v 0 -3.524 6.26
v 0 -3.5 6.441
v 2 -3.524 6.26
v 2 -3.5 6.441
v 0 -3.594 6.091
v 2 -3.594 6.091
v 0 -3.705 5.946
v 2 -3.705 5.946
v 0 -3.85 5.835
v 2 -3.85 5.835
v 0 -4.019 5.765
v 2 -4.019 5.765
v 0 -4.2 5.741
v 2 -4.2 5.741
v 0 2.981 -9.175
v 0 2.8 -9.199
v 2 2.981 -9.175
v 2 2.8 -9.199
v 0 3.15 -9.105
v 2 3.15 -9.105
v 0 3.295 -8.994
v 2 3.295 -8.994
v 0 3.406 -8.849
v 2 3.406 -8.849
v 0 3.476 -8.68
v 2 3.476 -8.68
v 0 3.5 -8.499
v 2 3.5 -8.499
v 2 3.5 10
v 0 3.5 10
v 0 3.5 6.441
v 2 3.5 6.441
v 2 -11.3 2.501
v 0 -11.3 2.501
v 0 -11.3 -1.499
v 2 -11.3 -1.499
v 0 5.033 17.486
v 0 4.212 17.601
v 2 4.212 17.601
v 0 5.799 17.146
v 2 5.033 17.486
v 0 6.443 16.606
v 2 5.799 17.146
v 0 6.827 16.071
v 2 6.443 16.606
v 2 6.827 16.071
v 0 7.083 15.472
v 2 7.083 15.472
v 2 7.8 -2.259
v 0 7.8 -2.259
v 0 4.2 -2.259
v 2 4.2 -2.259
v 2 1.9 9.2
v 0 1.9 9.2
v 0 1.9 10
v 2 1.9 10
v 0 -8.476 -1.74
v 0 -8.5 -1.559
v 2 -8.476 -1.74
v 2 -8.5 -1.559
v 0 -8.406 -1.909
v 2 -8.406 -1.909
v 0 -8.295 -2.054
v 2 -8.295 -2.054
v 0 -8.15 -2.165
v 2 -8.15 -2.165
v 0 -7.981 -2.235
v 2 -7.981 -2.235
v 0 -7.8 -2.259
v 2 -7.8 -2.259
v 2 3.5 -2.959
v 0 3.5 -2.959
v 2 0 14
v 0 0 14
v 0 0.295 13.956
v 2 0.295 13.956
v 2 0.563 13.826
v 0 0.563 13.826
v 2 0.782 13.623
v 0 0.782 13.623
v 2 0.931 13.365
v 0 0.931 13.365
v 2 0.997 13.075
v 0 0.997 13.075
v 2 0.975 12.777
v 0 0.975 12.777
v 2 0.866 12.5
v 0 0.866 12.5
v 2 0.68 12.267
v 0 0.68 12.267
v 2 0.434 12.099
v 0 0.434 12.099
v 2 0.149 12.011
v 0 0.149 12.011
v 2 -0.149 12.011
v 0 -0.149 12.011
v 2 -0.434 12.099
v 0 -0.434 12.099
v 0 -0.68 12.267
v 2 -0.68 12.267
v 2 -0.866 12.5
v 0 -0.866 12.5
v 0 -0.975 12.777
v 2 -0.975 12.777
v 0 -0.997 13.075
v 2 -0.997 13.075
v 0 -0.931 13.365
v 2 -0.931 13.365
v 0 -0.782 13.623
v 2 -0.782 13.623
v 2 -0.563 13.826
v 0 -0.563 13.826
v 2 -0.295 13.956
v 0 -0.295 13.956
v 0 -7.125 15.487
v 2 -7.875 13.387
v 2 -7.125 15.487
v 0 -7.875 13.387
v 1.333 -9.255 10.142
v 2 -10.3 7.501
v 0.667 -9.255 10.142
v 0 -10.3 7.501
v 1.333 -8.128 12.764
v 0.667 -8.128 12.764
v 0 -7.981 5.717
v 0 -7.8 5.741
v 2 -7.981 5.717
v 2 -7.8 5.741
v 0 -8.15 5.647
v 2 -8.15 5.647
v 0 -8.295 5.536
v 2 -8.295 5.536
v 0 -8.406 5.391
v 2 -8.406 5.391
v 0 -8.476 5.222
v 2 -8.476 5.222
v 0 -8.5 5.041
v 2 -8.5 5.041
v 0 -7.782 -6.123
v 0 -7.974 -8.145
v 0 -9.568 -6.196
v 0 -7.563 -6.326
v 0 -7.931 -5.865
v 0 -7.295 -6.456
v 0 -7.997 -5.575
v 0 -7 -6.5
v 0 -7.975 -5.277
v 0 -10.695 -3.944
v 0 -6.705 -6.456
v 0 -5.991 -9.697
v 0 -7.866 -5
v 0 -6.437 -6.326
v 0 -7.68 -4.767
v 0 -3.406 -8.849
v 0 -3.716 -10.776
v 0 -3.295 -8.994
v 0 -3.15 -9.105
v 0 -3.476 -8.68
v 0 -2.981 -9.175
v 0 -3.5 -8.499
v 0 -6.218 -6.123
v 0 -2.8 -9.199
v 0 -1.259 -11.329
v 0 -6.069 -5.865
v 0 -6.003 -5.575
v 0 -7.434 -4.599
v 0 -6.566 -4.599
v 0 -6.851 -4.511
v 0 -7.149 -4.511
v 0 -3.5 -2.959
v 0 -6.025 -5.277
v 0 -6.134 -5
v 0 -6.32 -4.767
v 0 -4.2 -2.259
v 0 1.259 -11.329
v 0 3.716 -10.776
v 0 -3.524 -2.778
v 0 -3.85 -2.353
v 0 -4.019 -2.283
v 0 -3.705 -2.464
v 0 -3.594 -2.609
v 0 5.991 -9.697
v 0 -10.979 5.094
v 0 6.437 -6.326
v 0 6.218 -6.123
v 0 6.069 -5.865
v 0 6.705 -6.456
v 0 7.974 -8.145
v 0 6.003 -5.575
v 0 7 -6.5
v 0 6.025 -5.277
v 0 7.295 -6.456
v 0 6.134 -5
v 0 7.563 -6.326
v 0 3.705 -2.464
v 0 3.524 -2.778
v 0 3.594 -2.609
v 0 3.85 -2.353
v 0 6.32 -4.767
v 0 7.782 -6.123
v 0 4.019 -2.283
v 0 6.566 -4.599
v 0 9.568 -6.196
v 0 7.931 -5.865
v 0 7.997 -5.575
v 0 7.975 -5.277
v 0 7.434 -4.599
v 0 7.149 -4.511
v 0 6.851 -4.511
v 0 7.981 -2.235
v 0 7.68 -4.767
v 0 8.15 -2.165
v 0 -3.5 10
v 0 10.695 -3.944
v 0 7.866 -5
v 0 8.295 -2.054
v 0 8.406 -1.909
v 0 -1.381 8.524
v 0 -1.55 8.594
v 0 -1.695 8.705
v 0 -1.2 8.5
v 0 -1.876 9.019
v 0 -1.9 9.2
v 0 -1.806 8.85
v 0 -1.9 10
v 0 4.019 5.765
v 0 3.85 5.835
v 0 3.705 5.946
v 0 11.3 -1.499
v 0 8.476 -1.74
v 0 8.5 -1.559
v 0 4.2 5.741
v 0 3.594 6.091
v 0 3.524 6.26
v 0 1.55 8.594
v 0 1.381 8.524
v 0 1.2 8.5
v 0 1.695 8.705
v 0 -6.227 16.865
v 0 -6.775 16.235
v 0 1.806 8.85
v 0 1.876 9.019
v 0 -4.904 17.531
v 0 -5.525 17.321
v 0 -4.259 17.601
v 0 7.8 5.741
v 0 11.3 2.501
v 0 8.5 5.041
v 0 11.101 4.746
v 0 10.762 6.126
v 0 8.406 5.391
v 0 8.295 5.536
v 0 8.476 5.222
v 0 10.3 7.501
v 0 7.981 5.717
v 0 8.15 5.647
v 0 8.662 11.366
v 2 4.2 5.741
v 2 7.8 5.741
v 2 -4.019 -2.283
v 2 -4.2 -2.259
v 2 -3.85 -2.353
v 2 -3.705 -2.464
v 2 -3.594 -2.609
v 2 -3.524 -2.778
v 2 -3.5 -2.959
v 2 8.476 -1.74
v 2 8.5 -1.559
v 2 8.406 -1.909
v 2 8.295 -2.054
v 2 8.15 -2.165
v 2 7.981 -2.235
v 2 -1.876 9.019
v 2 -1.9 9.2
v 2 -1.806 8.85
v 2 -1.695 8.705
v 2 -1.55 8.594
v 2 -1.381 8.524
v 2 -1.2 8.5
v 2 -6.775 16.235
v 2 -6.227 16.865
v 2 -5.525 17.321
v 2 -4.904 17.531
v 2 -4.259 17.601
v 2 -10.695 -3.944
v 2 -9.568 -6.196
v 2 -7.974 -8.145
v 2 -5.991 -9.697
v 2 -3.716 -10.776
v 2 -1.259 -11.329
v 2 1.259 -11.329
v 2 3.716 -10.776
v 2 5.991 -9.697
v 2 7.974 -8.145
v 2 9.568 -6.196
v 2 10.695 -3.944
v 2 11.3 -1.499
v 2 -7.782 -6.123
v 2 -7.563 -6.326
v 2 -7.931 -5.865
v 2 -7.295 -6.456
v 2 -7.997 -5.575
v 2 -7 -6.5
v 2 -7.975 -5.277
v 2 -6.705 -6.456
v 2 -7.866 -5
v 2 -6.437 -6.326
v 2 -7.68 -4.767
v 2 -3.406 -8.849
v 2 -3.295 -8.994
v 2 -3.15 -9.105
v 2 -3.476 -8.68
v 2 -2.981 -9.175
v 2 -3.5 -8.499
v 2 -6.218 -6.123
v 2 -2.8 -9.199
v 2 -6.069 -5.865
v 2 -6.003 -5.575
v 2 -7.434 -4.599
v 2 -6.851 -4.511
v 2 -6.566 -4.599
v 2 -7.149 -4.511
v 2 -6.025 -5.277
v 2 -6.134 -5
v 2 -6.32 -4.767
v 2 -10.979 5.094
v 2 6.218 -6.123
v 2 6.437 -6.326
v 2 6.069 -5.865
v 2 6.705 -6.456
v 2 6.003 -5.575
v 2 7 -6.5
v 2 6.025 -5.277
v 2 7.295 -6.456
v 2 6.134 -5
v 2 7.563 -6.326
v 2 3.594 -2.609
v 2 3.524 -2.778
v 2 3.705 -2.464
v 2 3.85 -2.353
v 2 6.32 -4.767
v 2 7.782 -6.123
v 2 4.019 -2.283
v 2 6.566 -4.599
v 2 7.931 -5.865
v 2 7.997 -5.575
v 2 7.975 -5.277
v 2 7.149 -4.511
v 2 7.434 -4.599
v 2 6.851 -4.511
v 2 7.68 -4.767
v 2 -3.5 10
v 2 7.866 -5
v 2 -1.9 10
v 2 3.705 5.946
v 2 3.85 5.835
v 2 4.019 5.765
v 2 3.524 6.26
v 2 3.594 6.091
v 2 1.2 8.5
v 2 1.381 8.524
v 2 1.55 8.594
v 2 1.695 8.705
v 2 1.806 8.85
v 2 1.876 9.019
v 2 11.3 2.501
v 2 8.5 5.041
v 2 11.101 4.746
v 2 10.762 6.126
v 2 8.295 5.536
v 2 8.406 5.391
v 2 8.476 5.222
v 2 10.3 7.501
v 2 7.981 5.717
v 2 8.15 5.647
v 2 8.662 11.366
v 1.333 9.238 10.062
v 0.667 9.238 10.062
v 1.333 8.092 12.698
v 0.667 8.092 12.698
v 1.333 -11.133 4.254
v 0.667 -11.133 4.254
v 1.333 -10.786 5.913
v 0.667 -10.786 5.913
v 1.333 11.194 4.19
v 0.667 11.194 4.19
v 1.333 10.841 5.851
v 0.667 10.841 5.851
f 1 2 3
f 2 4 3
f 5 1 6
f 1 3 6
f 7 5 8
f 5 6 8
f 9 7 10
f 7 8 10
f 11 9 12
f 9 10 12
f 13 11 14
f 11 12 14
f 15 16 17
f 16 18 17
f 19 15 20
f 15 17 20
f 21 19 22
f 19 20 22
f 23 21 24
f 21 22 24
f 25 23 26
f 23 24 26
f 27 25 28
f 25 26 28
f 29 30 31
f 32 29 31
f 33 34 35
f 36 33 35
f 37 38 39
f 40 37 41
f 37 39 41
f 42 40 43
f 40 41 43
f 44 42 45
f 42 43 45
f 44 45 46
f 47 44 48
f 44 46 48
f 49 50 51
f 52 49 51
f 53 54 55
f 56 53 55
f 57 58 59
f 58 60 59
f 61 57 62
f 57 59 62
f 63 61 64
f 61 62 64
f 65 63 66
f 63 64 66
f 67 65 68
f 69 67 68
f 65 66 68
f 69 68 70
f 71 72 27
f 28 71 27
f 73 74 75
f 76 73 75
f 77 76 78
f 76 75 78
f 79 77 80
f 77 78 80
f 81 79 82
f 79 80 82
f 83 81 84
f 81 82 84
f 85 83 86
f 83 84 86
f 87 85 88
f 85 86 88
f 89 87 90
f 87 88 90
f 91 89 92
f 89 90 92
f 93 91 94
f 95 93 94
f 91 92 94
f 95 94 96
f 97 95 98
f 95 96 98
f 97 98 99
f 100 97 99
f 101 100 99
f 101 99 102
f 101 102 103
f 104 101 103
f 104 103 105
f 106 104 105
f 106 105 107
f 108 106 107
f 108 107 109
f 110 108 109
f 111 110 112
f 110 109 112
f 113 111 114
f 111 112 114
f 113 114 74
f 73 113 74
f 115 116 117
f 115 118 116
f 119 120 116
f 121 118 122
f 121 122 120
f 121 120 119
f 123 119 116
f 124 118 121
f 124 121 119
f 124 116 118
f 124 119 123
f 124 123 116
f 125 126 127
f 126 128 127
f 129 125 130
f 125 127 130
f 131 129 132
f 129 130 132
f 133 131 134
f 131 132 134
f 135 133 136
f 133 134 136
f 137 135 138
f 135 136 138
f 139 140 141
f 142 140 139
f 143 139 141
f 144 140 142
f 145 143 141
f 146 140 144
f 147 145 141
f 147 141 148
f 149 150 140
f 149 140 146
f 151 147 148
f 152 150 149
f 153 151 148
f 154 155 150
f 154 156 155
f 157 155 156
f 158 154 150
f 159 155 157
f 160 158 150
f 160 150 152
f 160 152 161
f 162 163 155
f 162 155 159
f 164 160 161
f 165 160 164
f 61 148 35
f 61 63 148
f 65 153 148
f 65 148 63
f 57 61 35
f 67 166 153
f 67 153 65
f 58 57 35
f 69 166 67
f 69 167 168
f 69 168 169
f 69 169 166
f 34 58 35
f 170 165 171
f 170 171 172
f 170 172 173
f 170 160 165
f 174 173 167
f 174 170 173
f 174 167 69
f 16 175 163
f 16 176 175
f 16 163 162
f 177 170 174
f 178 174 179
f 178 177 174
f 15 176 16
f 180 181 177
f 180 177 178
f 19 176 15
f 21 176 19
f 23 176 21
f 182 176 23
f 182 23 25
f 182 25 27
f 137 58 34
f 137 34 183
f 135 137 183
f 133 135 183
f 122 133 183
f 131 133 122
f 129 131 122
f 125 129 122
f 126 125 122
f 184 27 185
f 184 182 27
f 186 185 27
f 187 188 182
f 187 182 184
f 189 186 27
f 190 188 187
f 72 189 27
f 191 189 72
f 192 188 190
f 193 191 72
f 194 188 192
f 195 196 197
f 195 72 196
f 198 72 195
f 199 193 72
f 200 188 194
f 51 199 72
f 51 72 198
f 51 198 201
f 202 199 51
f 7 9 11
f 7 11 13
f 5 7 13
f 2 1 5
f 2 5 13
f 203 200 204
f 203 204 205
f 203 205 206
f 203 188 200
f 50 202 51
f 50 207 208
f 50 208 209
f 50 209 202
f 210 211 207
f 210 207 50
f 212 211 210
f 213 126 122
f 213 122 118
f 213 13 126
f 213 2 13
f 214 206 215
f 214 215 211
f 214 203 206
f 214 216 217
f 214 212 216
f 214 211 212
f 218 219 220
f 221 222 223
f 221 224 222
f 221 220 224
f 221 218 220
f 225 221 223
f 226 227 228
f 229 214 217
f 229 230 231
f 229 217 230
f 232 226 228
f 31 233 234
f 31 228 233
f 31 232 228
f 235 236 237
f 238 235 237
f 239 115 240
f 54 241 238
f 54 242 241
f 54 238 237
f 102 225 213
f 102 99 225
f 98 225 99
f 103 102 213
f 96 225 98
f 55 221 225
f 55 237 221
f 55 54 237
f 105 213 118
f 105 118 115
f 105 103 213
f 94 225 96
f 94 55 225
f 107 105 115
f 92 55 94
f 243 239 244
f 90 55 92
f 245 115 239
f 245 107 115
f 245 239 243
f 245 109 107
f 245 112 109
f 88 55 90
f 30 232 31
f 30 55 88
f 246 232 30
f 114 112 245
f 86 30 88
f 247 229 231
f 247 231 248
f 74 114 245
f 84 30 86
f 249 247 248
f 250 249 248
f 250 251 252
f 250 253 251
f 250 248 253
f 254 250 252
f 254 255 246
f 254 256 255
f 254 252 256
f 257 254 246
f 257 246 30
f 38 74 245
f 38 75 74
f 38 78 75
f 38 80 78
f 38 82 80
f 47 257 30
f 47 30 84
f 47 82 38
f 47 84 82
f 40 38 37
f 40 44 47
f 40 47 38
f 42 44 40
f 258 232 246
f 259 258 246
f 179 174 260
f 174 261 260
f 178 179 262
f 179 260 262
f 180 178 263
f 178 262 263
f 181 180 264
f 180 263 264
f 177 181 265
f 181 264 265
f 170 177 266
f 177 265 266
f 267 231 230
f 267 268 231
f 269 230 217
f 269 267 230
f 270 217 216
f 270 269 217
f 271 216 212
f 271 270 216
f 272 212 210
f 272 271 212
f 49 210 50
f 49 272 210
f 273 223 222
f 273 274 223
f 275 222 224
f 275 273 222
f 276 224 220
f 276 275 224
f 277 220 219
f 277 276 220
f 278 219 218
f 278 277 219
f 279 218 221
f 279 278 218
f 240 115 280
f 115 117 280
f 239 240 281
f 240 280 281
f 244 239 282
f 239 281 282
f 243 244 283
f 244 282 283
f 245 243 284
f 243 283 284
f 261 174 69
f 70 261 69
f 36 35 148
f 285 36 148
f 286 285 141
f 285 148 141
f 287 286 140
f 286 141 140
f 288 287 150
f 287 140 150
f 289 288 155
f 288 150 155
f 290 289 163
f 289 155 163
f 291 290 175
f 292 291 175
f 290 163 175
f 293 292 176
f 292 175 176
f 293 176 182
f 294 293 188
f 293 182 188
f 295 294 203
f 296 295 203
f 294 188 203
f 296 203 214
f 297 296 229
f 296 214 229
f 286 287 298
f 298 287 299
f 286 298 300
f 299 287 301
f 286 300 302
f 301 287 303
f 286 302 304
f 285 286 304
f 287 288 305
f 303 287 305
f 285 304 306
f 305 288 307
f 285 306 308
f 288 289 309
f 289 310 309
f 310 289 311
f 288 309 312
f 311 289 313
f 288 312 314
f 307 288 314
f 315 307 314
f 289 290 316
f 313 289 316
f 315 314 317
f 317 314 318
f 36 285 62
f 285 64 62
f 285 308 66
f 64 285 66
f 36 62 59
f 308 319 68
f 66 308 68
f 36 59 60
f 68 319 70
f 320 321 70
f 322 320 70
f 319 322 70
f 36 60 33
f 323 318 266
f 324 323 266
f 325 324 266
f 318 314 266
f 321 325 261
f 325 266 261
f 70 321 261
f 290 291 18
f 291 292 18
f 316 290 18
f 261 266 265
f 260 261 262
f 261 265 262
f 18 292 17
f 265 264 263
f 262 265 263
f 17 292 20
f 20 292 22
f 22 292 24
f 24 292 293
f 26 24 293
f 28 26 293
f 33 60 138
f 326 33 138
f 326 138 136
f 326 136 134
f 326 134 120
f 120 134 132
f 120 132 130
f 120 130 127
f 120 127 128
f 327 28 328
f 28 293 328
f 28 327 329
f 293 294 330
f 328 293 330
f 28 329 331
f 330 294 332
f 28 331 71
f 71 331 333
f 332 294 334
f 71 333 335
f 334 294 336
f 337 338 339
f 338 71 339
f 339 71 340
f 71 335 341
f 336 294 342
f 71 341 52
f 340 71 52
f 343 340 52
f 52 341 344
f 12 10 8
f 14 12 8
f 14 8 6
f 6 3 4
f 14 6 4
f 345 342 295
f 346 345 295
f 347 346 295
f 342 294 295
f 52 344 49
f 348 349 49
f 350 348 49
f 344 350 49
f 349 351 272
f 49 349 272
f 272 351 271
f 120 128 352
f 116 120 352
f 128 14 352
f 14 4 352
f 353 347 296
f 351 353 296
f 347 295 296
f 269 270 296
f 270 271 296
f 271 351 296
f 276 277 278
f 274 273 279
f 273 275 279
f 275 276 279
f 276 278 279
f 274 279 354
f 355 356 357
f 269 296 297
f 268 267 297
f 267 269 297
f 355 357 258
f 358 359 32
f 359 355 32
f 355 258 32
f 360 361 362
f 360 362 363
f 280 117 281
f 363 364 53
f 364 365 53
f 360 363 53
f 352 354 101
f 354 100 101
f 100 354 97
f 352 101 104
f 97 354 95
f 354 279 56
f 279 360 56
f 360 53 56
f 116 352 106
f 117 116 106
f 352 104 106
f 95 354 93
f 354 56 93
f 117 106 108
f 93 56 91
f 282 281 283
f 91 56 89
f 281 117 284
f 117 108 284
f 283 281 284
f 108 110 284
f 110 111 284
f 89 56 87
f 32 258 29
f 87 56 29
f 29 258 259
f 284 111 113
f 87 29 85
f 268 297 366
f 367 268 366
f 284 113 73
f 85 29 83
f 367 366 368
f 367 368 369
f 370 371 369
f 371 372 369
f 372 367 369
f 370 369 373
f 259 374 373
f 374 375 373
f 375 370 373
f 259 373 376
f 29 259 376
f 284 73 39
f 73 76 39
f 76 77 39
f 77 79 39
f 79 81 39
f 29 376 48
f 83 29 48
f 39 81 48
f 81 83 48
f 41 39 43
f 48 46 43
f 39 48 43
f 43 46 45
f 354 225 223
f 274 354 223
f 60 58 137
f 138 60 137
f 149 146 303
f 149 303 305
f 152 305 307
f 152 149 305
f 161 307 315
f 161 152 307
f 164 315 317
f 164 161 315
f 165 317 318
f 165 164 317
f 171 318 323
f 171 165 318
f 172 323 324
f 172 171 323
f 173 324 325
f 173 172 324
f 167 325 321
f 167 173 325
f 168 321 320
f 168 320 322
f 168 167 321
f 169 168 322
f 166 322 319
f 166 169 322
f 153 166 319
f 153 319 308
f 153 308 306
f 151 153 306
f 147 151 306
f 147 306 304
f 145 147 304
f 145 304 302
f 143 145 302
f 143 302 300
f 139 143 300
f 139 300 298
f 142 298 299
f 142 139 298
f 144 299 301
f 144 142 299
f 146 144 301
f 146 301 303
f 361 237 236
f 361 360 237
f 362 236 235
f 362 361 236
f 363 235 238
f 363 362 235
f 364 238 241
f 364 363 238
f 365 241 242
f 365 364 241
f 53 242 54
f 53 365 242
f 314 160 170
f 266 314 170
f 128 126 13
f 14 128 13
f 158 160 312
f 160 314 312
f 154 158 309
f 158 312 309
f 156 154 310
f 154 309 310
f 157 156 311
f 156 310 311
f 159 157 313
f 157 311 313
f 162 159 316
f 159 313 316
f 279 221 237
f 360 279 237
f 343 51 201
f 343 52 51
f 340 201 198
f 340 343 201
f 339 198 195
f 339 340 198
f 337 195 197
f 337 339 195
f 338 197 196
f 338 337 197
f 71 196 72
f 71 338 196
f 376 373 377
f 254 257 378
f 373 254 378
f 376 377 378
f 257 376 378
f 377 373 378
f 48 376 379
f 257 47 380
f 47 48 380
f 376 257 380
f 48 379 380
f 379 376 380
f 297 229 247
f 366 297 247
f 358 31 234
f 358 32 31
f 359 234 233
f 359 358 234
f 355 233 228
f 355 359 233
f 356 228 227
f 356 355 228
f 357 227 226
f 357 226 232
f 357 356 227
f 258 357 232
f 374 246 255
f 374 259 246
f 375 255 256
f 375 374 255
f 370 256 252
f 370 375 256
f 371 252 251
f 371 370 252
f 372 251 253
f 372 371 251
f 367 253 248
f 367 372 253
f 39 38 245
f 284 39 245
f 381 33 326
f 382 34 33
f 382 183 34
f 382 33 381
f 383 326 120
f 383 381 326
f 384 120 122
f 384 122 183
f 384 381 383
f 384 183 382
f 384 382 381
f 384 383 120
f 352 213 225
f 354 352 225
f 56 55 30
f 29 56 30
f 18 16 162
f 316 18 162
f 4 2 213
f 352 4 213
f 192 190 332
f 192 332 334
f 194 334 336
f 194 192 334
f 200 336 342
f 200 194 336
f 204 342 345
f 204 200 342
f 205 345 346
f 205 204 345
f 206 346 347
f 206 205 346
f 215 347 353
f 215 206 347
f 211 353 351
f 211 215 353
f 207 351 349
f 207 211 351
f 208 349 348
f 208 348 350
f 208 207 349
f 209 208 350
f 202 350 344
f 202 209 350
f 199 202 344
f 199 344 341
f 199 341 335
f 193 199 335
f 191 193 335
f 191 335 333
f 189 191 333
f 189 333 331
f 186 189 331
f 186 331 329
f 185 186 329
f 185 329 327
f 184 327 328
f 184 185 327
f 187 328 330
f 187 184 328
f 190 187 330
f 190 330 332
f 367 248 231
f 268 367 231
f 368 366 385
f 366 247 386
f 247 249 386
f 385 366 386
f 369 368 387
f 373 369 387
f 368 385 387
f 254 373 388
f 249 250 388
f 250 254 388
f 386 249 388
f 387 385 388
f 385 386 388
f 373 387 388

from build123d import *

# Parameters (mm, degrees)
SCHIZZO1_R                   = 1
ESTRUSIONE_ESTRUSIONE1_DEPTH = 2
RACCORDO2_R                  = 3
RACCORDO3_R                  = 3
RACCORDO4_R                  = 0.7
RACCORDO5_R                  = 0.7


with BuildPart() as part:
    # Schizzo1 → Estrusione-Estrusione1 (new body)
    with BuildSketch(Plane(origin=(0, 0, 0), x_dir=(0, 0, -1), z_dir=(1, 0, 0))):
        with BuildLine():
            add(Edge.make_bspline(
                [(-7.501010101, -10.3), (-10.845030199, -9.13986581), (-13.865102381, -7.304364218), (-17.601010101, -6.594005849)],
                knots=[0.271280726, 0.271280726, 0.271280726, 0.271280726, 0.852483684, 0.852483684, 0.852483684, 0.852483684], degree=3))
            add(Edge.make_bspline(
                [(-2.501010101, -11.3), (-4.308742426, -11.235865063), (-5.940164296, -10.841501107), (-7.501010101, -10.3)],
                knots=[0, 0, 0, 0, 0.271280726, 0.271280726, 0.271280726, 0.271280726], degree=3))
            Line((-2.501010101, -11.3), (1.498989899, -11.3))
            ThreePointArc((1.498989899, -11.3), (11.398989899, 0), (1.498989899, 11.3))
            Line((1.498989899, 11.3), (-2.501010101, 11.3))
            add(Edge.make_bspline(
                [(-2.501010101, 11.3), (-4.209338931, 11.338090952), (-5.850739142, 10.914740779), (-7.501010101, 10.3)],
                knots=[0, 0, 0, 0, 0.293888871, 0.293888871, 0.293888871, 0.293888871], degree=3))
            add(Edge.make_bspline(
                [(-7.501010101, 10.3), (-10.658273676, 9.123890914), (-13.848006436, 7.247243694), (-17.601010101, 6.561146452)],
                knots=[0.293888871, 0.293888871, 0.293888871, 0.293888871, 0.856150858, 0.856150858, 0.856150858, 0.856150858], degree=3))
            Line((-17.601010101, 6.561146452), (-17.601010101, 0))
            Line((-17.601010101, 0), (-17.601010101, -6.594005849))
        make_face()
        Polygon((-8.5, 1.9), (-10, 1.9), (-10, 3.5), (-5.741010101, 3.5), (-5.741010101, 8.5), (2.258989899, 8.5), (2.258989899, 3.5), (9.198989899, 3.5), (9.198989899, -3.5), (2.258989899, -3.5), (2.258989899, -8.5), (-5.741010101, -8.5), (-5.741010101, -3.5), (-10, -3.5), (-10, -1.9), (-8.5, -1.9), align=None, mode=Mode.SUBTRACT)
        with BuildLine():
            ThreePointArc((-12, 0), (-13, -1), (-14, 0))
            ThreePointArc((-14, 0), (-13, 1), (-12, 0))
        make_face(mode=Mode.SUBTRACT)
        with Locations((5.5, -7)):
            Circle(SCHIZZO1_R, mode=Mode.SUBTRACT)
        with Locations((5.5, 7)):
            Circle(SCHIZZO1_R, mode=Mode.SUBTRACT)
    extrude(amount=ESTRUSIONE_ESTRUSIONE1_DEPTH)

    # Raccordo2
    raccordo2_edges = [part.edges().sort_by_distance(p)[0] for p in [
        (1, -6.594005849, 17.601010101),
    ]]
    fillet(raccordo2_edges, radius=RACCORDO2_R)

    # Raccordo3
    raccordo3_edges = [part.edges().sort_by_distance(p)[0] for p in [
        (1, 6.561146452, 17.601010101),
    ]]
    fillet(raccordo3_edges, radius=RACCORDO3_R)

    # Raccordo4
    raccordo4_edges = [part.edges().sort_by_distance(p)[0] for p in [
        (1, 3.5, -9.198989899),
        (1, 3.5, -2.258989899),
        (1, 8.5, -2.258989899),
        (1, 8.5, 5.741010101),
        (1, 3.5, 5.741010101),
        (1, -3.5, 5.741010101),
        (1, -8.5, 5.741010101),
        (1, -8.5, -2.258989899),
        (1, -3.5, -9.198989899),
        (1, -3.5, -2.258989899),
    ]]
    fillet(raccordo4_edges, radius=RACCORDO4_R)

    # Raccordo5
    raccordo5_edges = [part.edges().sort_by_distance(p)[0] for p in [
        (1, 1.9, 8.5),
        (1, -1.9, 8.5),
    ]]
    fillet(raccordo5_edges, radius=RACCORDO5_R)


solid = part.part
